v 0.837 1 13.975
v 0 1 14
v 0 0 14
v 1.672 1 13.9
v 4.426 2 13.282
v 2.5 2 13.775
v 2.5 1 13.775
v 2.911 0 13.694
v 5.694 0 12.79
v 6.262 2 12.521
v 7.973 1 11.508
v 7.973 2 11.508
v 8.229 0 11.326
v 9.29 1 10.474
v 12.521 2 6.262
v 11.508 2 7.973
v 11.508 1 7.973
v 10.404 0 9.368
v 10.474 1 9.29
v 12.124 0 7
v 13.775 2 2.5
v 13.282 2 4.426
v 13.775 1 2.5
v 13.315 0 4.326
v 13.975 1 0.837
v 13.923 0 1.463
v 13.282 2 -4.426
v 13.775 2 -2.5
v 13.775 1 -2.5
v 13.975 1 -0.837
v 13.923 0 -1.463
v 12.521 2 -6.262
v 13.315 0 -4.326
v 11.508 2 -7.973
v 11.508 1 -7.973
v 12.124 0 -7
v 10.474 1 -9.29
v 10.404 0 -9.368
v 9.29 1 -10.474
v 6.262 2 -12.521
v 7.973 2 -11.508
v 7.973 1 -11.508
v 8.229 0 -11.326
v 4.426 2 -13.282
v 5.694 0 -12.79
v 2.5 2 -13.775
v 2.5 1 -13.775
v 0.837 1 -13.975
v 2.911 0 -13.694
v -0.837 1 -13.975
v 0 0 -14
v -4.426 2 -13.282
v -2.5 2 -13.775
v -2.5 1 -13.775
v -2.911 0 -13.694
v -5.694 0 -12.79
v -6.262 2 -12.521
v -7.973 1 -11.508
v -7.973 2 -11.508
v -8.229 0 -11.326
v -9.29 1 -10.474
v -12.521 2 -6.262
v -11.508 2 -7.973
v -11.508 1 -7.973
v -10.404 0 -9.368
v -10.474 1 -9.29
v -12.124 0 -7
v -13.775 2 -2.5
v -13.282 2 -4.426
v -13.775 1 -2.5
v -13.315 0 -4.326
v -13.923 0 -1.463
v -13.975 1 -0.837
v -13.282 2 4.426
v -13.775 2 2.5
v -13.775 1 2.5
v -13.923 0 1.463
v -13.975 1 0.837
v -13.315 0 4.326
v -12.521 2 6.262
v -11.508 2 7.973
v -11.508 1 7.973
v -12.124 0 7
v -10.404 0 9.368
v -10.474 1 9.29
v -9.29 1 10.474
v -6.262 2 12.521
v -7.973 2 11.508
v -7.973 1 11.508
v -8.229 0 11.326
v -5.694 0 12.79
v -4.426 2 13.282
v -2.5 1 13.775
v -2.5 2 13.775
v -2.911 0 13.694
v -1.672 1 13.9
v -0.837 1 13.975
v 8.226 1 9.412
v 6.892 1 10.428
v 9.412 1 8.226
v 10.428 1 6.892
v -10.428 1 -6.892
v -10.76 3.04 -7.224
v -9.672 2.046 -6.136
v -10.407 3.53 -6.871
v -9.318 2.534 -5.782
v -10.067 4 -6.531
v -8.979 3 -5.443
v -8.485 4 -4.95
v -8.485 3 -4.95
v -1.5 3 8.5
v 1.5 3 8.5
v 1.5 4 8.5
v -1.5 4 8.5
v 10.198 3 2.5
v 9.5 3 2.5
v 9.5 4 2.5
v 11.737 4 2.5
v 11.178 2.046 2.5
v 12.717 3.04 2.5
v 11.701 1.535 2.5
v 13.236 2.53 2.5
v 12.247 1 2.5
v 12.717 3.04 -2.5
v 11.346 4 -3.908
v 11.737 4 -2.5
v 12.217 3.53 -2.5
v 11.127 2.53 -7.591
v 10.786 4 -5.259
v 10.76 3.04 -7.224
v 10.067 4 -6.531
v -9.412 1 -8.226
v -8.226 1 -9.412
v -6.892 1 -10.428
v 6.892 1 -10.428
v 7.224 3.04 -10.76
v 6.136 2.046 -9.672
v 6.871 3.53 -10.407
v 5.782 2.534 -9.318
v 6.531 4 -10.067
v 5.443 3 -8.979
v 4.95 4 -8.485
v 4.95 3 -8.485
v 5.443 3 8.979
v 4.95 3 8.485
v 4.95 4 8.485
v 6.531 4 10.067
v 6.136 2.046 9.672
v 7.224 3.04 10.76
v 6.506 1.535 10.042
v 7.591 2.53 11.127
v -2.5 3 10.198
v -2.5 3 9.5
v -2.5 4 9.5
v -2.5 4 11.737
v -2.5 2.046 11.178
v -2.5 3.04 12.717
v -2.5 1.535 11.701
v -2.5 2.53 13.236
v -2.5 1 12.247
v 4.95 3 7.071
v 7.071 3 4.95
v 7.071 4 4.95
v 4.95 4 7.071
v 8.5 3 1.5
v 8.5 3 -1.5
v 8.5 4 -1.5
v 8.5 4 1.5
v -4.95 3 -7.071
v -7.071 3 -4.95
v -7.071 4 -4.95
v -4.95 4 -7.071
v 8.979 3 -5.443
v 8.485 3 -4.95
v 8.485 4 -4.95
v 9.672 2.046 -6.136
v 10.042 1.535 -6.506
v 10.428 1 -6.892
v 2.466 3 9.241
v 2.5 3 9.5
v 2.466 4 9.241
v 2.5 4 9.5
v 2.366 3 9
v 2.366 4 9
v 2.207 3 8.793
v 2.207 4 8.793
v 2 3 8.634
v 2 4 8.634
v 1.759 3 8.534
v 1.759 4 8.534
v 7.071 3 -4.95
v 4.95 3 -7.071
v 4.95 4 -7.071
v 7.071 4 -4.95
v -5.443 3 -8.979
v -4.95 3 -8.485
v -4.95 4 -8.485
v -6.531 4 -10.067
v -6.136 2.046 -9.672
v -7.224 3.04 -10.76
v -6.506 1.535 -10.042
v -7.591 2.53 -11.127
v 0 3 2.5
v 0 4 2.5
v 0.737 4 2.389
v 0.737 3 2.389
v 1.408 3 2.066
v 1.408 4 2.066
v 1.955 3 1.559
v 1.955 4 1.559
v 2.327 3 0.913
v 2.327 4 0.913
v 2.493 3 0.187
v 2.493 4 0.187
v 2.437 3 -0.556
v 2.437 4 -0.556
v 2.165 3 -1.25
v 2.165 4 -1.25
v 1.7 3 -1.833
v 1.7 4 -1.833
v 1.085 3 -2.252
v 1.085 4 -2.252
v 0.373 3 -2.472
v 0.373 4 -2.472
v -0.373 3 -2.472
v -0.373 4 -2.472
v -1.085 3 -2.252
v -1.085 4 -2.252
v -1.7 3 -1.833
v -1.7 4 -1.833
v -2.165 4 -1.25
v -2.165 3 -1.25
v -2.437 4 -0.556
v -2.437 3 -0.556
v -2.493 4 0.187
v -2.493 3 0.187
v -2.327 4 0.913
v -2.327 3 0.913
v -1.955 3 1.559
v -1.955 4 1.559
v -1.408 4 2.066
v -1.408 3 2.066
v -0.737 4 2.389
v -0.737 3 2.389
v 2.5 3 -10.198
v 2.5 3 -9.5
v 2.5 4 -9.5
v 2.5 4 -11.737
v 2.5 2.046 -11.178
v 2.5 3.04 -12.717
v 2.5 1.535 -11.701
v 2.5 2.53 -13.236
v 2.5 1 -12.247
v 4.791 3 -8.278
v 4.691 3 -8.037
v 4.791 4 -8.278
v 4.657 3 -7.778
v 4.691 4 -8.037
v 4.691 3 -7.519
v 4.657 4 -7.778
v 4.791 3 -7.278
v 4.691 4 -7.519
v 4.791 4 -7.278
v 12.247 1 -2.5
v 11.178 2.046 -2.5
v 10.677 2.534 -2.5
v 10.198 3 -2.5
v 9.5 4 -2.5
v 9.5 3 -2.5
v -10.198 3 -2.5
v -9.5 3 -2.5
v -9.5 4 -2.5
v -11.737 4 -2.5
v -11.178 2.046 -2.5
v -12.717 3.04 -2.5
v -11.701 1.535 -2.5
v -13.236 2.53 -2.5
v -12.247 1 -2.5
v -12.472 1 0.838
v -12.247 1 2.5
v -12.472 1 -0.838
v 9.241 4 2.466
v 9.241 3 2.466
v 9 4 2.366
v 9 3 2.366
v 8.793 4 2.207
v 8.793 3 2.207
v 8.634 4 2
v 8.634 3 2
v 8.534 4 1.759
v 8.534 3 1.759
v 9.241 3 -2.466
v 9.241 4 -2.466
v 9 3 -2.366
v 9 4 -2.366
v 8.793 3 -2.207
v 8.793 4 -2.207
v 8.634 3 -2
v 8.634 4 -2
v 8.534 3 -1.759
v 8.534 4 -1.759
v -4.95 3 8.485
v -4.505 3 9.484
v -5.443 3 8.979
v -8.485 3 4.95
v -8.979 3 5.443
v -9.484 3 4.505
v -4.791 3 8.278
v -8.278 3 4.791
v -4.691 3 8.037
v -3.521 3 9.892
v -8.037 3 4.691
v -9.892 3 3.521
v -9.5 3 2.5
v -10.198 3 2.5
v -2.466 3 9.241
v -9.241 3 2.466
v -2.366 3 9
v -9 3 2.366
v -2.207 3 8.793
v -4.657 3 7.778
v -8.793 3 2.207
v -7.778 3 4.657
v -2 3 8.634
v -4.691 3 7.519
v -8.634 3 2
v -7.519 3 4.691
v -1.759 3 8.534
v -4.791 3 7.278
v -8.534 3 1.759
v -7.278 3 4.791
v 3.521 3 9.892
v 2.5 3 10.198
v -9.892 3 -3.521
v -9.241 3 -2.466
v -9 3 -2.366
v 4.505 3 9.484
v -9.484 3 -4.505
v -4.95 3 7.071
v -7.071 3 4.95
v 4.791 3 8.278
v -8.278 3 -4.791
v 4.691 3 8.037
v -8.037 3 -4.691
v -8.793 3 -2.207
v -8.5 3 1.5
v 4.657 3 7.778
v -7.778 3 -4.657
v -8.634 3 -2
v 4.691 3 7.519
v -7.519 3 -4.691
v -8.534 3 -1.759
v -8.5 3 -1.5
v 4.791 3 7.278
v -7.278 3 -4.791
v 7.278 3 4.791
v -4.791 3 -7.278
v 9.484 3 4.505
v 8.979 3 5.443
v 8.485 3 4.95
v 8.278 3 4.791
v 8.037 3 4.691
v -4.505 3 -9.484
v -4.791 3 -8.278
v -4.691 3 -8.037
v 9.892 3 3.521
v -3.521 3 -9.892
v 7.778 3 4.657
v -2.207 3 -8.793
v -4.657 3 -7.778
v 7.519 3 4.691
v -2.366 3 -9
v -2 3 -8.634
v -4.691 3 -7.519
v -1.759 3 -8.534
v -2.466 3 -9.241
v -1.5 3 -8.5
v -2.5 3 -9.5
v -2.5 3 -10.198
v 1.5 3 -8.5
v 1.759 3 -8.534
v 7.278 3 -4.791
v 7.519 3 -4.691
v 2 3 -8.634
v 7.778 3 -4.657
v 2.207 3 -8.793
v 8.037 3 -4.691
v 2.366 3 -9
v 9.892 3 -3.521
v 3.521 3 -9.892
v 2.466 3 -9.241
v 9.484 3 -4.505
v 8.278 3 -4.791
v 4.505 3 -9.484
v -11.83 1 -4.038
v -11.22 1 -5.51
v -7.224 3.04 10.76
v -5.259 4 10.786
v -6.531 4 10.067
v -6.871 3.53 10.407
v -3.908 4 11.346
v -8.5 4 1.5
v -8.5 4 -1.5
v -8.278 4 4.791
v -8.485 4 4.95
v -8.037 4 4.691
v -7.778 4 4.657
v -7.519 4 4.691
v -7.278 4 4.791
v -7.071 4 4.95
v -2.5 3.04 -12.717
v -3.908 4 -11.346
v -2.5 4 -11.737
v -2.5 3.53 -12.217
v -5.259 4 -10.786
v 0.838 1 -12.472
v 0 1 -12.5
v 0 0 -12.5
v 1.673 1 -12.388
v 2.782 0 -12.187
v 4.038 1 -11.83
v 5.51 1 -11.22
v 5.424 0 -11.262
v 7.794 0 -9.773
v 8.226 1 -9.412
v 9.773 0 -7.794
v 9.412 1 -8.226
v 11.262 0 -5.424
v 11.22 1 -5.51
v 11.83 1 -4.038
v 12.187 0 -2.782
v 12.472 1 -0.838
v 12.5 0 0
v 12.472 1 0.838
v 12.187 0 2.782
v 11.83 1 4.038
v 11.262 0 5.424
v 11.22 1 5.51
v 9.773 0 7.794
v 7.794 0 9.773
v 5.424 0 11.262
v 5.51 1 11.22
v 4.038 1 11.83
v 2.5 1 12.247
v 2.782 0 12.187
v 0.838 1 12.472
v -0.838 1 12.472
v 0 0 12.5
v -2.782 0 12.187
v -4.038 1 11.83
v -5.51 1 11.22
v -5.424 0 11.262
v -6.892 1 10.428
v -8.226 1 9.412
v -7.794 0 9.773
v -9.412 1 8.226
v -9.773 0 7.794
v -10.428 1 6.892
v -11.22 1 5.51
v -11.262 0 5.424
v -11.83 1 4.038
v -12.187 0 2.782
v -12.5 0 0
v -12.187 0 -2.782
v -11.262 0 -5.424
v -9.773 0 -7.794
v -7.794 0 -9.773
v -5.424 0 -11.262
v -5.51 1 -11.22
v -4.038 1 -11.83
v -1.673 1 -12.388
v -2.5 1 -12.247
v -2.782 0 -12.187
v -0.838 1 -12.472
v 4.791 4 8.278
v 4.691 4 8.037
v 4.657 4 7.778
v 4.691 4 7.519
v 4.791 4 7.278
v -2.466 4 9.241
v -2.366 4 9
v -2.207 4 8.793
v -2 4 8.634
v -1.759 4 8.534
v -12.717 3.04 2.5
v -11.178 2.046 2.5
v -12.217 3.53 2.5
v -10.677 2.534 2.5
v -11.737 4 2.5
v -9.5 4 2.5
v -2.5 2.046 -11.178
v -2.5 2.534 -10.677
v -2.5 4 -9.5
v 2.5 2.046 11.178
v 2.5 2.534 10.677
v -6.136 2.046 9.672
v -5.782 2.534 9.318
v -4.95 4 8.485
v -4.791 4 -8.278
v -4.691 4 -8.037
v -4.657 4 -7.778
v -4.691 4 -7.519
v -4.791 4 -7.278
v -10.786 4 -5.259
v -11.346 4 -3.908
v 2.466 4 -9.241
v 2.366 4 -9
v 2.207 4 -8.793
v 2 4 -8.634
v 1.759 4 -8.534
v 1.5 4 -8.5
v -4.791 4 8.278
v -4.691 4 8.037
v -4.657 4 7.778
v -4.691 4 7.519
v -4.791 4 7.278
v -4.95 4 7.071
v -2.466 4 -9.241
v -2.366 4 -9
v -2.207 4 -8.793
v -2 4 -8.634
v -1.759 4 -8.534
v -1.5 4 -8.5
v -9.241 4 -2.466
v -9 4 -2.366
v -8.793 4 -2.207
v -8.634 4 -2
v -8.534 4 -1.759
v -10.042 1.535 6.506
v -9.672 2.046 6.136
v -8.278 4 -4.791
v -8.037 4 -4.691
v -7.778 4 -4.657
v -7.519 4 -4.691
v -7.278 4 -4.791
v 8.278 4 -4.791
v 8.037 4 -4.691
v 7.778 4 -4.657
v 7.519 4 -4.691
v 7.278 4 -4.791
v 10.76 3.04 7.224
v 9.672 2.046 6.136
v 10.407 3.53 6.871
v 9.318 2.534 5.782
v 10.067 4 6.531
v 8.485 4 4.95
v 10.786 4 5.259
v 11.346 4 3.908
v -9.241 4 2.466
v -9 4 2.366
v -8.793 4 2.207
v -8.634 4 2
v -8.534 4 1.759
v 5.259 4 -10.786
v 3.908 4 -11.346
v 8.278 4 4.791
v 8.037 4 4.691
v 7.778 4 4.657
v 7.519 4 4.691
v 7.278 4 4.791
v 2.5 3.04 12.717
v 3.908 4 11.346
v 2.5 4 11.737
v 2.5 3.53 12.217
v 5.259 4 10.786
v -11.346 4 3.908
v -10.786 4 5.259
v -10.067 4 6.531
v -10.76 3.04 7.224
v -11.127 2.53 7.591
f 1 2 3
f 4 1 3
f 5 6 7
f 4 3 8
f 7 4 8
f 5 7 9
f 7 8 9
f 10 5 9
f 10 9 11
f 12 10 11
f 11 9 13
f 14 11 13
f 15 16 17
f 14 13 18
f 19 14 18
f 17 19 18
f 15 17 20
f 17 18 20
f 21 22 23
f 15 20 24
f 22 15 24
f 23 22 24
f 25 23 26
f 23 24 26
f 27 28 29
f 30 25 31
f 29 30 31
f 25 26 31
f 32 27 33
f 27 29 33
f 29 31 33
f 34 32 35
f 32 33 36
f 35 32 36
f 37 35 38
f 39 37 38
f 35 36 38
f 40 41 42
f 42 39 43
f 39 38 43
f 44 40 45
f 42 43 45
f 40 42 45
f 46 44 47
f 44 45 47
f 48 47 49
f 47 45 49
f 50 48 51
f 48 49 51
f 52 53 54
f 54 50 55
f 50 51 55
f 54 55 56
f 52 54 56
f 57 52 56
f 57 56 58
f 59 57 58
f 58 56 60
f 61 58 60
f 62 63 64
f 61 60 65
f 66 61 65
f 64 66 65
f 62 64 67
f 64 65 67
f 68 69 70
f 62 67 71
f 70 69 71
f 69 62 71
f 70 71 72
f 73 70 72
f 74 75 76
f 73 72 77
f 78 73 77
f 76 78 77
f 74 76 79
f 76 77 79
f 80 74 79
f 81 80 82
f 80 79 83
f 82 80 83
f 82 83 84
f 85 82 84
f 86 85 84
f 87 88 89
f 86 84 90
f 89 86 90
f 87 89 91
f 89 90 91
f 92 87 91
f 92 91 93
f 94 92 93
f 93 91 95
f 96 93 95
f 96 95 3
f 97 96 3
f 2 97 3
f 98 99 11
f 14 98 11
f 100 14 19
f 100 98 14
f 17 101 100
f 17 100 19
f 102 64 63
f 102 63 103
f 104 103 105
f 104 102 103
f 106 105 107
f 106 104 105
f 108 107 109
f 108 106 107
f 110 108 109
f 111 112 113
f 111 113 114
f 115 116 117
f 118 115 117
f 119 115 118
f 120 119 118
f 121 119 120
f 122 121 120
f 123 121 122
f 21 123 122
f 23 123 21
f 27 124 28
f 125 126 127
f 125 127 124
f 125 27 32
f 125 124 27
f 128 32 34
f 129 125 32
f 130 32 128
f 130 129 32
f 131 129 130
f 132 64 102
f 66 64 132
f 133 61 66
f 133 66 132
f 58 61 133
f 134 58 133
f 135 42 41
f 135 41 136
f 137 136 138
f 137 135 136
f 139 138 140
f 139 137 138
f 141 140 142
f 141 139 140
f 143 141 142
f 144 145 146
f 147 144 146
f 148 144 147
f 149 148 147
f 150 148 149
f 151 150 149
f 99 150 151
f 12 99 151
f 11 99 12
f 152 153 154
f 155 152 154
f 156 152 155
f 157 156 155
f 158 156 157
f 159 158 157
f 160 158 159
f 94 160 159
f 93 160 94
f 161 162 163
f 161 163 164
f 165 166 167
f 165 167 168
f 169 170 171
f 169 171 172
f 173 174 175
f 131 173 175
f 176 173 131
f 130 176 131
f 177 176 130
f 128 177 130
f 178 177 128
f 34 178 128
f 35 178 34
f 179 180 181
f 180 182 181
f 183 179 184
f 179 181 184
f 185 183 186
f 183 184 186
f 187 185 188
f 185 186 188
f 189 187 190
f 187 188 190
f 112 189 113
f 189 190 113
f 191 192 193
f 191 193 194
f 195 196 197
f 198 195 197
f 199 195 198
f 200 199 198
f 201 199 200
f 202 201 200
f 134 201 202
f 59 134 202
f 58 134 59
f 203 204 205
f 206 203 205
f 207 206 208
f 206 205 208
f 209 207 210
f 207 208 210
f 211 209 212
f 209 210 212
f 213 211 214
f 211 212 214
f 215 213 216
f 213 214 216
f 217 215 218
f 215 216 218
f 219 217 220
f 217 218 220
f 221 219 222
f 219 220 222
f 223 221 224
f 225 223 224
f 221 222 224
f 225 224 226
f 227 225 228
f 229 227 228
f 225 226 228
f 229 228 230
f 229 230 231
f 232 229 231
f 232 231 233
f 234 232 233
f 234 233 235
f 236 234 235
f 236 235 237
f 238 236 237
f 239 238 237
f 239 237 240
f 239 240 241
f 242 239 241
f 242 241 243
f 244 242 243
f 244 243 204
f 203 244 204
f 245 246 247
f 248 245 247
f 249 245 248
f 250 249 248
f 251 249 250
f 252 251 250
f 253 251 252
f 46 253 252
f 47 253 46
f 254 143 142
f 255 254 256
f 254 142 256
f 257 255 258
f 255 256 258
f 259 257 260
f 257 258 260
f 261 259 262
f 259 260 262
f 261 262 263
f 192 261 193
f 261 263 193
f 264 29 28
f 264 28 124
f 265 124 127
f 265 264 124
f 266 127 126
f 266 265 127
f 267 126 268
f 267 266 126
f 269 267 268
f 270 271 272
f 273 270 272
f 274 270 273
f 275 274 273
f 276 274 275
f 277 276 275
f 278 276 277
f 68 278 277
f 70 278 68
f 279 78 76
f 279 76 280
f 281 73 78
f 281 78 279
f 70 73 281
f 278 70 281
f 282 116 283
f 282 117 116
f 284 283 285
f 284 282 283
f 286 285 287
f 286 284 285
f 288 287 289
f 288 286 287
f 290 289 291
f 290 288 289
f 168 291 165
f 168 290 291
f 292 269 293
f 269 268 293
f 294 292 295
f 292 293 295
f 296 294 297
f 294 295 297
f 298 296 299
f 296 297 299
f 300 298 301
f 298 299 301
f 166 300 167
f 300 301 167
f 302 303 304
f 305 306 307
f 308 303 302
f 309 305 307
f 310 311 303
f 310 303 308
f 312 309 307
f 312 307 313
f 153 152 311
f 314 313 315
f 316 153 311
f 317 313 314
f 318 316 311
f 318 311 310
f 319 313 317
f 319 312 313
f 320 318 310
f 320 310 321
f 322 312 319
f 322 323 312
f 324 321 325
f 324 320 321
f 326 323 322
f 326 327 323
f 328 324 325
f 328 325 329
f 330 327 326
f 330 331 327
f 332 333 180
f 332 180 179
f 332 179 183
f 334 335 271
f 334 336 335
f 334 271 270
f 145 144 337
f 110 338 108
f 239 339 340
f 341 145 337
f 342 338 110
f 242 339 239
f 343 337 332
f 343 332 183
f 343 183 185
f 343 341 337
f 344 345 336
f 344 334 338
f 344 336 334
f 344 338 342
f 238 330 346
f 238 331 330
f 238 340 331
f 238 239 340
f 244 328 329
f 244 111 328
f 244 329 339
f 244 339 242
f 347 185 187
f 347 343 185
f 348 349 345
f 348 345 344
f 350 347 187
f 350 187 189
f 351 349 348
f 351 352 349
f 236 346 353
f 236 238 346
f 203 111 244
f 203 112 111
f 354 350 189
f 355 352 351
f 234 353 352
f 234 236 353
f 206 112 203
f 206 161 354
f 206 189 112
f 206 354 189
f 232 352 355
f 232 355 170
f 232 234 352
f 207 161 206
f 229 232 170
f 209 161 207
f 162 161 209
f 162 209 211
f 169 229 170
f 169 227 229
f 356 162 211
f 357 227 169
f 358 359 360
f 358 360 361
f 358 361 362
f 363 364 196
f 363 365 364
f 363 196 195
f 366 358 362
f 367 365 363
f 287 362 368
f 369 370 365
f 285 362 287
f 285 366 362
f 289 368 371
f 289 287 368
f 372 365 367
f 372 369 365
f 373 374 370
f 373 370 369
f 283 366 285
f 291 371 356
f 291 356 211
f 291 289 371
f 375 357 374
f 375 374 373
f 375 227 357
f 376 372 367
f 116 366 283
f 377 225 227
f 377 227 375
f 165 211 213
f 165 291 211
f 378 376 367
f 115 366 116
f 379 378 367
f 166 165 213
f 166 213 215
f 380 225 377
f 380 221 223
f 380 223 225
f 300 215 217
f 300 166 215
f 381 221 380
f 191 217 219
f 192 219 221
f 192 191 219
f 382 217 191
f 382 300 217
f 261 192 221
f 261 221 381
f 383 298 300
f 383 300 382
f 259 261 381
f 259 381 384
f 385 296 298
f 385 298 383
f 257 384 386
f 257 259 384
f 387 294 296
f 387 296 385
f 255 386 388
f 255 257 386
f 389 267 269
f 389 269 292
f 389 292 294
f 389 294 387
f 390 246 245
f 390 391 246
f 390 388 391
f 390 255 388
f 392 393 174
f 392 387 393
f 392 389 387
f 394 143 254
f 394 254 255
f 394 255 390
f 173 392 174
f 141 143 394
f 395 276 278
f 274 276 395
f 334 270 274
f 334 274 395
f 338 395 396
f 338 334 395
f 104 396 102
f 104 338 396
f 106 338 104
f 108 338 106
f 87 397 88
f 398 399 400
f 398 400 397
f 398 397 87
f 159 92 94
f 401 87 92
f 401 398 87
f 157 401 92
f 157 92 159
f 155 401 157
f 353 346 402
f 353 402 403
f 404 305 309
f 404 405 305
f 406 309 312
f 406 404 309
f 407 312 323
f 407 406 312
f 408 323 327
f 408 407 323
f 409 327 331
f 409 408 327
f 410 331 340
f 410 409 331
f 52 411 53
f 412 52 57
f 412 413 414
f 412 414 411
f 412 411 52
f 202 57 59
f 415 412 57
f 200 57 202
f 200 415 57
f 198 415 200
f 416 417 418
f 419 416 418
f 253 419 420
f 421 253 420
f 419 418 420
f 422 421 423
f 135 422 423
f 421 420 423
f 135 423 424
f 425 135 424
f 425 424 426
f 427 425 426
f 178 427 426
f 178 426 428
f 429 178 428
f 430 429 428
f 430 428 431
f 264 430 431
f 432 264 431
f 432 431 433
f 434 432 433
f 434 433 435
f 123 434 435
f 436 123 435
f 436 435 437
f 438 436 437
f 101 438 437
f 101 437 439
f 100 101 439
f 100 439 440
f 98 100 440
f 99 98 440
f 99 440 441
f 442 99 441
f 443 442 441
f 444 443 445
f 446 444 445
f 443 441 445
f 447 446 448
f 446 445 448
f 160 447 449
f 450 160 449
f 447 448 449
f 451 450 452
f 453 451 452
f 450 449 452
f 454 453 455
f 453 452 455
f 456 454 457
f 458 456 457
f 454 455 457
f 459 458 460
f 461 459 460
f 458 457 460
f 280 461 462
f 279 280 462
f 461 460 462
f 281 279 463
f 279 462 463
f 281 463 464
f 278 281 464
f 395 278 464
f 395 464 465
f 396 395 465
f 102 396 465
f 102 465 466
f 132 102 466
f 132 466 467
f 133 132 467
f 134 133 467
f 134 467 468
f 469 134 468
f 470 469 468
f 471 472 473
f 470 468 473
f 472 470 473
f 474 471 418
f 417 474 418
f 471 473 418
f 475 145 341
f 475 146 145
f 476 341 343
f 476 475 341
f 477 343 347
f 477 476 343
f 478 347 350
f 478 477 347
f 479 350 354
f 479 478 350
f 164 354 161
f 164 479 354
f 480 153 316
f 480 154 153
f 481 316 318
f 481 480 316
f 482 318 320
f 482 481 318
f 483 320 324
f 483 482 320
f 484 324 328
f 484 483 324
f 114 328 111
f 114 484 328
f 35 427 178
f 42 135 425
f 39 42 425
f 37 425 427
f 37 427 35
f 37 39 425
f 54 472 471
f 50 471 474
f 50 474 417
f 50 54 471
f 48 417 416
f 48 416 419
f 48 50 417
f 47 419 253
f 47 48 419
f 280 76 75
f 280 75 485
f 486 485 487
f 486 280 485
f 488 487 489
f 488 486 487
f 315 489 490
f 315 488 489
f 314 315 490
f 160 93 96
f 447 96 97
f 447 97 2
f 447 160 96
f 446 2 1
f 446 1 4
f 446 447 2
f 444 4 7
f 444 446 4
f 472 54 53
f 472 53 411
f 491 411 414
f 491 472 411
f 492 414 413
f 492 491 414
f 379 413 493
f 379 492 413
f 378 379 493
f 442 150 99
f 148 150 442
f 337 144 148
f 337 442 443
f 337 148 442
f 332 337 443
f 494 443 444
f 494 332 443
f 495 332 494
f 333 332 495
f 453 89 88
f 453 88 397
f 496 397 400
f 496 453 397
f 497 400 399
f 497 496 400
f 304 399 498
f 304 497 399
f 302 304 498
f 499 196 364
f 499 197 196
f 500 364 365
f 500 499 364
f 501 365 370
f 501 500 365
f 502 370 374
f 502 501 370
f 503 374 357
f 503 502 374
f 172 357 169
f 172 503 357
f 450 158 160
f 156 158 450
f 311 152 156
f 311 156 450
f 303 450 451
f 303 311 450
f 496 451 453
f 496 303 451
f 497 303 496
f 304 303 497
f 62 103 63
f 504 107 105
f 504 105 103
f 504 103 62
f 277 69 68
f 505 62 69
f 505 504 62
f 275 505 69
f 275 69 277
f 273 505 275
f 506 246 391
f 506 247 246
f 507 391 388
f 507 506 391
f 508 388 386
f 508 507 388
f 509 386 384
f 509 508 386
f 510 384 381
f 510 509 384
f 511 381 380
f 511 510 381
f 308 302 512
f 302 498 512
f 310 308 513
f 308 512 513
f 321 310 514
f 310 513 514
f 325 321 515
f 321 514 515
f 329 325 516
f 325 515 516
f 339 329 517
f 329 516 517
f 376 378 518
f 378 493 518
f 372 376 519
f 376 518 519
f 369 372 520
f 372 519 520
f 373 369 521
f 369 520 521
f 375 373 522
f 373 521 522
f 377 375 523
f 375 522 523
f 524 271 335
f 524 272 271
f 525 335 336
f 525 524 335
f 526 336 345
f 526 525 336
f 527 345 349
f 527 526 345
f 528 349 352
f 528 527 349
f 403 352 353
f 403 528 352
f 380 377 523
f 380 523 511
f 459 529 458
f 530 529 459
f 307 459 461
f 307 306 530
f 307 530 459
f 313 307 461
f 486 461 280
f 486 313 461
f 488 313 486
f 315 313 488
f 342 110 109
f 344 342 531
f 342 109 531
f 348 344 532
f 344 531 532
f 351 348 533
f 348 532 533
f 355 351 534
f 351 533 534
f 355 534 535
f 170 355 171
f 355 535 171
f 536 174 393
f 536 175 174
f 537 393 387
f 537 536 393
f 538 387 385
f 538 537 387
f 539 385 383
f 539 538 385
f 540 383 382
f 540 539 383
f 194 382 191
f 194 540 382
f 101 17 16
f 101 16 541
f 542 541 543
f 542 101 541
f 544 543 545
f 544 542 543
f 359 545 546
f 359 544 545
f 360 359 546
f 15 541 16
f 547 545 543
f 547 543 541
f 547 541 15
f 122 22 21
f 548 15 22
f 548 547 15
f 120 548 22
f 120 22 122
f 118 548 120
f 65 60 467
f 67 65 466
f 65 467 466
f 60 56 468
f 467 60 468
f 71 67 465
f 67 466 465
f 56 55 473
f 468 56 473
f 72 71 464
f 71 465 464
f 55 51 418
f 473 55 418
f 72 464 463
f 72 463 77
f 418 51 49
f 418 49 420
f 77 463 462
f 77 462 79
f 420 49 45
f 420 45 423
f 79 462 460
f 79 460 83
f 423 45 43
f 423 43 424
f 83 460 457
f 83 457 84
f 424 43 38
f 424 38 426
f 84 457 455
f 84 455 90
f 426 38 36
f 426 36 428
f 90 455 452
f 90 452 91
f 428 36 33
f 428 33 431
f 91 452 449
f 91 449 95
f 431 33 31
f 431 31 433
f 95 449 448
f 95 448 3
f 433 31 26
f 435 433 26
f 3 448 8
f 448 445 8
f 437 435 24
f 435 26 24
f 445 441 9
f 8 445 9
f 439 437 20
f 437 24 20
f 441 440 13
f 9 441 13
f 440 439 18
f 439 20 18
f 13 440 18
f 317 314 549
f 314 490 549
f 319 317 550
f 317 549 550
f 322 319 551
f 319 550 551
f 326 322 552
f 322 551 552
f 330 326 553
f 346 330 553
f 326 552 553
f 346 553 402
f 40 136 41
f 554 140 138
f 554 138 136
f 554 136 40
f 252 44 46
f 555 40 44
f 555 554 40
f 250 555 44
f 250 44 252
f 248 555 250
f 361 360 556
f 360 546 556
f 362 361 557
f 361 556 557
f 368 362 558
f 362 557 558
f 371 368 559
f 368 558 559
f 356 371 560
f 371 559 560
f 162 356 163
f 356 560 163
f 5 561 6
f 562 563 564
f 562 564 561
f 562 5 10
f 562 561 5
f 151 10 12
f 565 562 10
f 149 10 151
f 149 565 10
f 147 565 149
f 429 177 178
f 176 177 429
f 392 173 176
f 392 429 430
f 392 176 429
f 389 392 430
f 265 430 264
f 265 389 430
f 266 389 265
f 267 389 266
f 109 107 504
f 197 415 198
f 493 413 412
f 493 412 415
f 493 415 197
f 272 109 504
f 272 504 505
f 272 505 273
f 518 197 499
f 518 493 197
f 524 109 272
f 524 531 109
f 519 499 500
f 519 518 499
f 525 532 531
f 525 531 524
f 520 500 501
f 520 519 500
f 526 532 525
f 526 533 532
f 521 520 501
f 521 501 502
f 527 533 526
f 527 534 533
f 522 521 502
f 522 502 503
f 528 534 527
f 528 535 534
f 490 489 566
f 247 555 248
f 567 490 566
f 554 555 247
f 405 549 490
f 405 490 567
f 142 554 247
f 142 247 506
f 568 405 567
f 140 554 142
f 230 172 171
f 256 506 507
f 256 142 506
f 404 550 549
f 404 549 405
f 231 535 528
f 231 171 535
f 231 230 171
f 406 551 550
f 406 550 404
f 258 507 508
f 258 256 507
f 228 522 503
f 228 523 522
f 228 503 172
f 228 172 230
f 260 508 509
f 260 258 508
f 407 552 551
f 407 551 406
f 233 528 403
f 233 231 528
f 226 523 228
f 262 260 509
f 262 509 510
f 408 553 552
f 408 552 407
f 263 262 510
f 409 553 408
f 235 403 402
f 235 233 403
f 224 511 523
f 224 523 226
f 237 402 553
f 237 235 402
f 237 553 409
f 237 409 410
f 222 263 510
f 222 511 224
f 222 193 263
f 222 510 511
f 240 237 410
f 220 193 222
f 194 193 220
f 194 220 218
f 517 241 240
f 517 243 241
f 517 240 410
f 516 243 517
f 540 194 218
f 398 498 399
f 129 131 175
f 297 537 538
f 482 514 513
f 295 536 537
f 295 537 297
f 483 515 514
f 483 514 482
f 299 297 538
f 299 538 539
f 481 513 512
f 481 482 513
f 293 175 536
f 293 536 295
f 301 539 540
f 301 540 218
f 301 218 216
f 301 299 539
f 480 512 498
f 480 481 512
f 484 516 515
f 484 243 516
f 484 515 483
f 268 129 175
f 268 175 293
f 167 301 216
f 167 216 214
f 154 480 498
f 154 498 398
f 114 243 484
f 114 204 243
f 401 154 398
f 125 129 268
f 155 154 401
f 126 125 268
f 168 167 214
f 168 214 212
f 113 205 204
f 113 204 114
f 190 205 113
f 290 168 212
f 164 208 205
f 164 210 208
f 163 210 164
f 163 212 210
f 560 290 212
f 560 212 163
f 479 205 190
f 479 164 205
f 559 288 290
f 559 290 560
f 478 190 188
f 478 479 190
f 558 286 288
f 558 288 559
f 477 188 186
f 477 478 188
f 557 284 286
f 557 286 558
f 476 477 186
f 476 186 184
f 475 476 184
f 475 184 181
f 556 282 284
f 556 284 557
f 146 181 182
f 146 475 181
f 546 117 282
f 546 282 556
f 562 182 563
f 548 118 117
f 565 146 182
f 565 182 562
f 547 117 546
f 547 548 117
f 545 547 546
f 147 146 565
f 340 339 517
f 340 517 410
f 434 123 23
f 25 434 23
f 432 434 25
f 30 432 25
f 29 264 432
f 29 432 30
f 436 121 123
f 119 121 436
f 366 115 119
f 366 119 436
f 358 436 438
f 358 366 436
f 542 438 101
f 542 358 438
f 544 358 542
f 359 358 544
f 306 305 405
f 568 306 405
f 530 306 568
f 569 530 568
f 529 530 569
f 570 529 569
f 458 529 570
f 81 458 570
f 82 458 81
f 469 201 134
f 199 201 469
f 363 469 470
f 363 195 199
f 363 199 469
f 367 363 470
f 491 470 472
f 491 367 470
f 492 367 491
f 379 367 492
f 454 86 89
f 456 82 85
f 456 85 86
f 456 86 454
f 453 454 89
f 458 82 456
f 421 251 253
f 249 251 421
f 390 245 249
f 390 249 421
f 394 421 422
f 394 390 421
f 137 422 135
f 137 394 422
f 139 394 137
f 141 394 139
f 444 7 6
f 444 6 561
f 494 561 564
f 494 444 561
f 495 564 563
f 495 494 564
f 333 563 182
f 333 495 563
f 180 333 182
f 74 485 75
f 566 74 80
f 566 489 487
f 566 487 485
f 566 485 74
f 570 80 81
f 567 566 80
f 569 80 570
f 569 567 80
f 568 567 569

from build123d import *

# Parameters (mm, degrees)
SKETCH1_R           = 14
BOSS_EXTRUDE1_DEPTH = 4
SKETCH2_R           = 12.5
CUT_EXTRUDE1_DEPTH  = 3
CHAMFER2_SIZE       = 2
CUT_EXTRUDE2_START  = -3
CUT_EXTRUDE2_DEPTH  = 3
FILLET2_R           = 1
SKETCH4_R           = 2.5
CUT_EXTRUDE3_DEPTH  = 3


with BuildPart() as part:
    # Sketch1 → Boss-Extrude1 (new body)
    with BuildSketch(Plane(origin=(0, 0, 0), x_dir=(1, 0, 0), z_dir=(0, 1, 0))):
        Circle(SKETCH1_R)
    extrude(amount=BOSS_EXTRUDE1_DEPTH)

    # Sketch2 → Cut-Extrude1 (cut)
    with BuildSketch(Plane.XZ):
        Circle(SKETCH2_R)
    extrude(amount=-CUT_EXTRUDE1_DEPTH, mode=Mode.SUBTRACT)

    # Chamfer2
    chamfer2_edges = [part.edges().sort_by_distance(p)[0] for p in [
        (-12.5, 3, 0),
        (-14, 4, 0),
    ]]
    chamfer(chamfer2_edges, length=CHAMFER2_SIZE)

    # Sketch3 → Cut-Extrude2 (cut)
    with BuildSketch(Plane(origin=(0, 4, 0), x_dir=(1, 0, 0), z_dir=(0, 1, 0)).offset(CUT_EXTRUDE2_START)):
        with BuildLine():
            ThreePointArc((-13.774977314, 2.5), (-14, 0), (-13.774977314, -2.5))
            Line((-13.774977314, -2.5), (-8.5, -2.5))
            Line((-8.5, -2.5), (-8.5, 2.5))
            Line((-8.5, 2.5), (-13.774977314, 2.5))
        make_face()
        with BuildLine():
            Line((-4.242640687, 7.778174593), (-7.972612916, 11.508146822))
            ThreePointArc((-7.972612916, 11.508146822), (-9.899494937, 9.899494937), (-11.508146822, 7.972612916))
            Line((-11.508146822, 7.972612916), (-7.778174593, 4.242640687))
            Line((-7.778174593, 4.242640687), (-4.242640687, 7.778174593))
        make_face()
        with BuildLine():
            Line((-7.972612916, -11.508146822), (-4.242640687, -7.778174593))
            Line((-4.242640687, -7.778174593), (-7.778174593, -4.242640687))
            Line((-7.778174593, -4.242640687), (-11.508146822, -7.972612916))
            ThreePointArc((-11.508146822, -7.972612916), (-9.899494937, -9.899494937), (-7.972612916, -11.508146822))
        make_face()
        with BuildLine():
            Line((2.5, 8.5), (2.5, 13.774977314))
            ThreePointArc((2.5, 13.774977314), (0, 14), (-2.5, 13.774977314))
            Line((-2.5, 13.774977314), (-2.5, 8.5))
            Line((-2.5, 8.5), (2.5, 8.5))
        make_face()
        with BuildLine():
            Line((2.5, -13.774977314), (2.5, -8.5))
            Line((2.5, -8.5), (-2.5, -8.5))
            Line((-2.5, -8.5), (-2.5, -13.774977314))
            ThreePointArc((-2.5, -13.774977314), (0, -14), (2.5, -13.774977314))
        make_face()
        with BuildLine():
            Line((7.778174593, 4.242640687), (11.508146822, 7.972612916))
            ThreePointArc((11.508146822, 7.972612916), (9.899494937, 9.899494937), (7.972612916, 11.508146822))
            Line((7.972612916, 11.508146822), (4.242640687, 7.778174593))
            Line((4.242640687, 7.778174593), (7.778174593, 4.242640687))
        make_face()
        with BuildLine():
            Line((11.508146822, -7.972612916), (7.778174593, -4.242640687))
            Line((7.778174593, -4.242640687), (4.242640687, -7.778174593))
            Line((4.242640687, -7.778174593), (7.972612916, -11.508146822))
            ThreePointArc((7.972612916, -11.508146822), (9.899494937, -9.899494937), (11.508146822, -7.972612916))
        make_face()
        with BuildLine():
            Line((8.5, -2.5), (13.774977314, -2.5))
            ThreePointArc((13.774977314, -2.5), (14, 0), (13.774977314, 2.5))
            Line((13.774977314, 2.5), (8.5, 2.5))
            Line((8.5, 2.5), (8.5, -2.5))
        make_face()
    extrude(amount=CUT_EXTRUDE2_DEPTH, mode=Mode.SUBTRACT)

    # Fillet2
    fillet2_edges = [part.edges().sort_by_distance(p)[0] for p in [
        (8.5, 3.5, 2.5),
        (4.242640687, 3.5, 7.778174593),
        (8.5, 3.5, -2.5),
        (7.778174593, 3.5, -4.242640687),
        (4.242640687, 3.5, -7.778174593),
        (-2.5, 3.5, -8.5),
        (2.5, 3.5, -8.5),
        (-4.242640687, 3.5, -7.778174593),
        (-7.778174593, 3.5, -4.242640687),
        (-8.5, 3.5, 2.5),
        (-8.5, 3.5, -2.5),
        (-4.242640687, 3.5, 7.778174593),
        (2.5, 3.5, 8.5),
        (7.778174593, 3.5, 4.242640687),
        (-7.778174593, 3.5, 4.242640687),
        (-2.5, 3.5, 8.5),
    ]]
    fillet(fillet2_edges, radius=FILLET2_R)

    # Sketch4 → Cut-Extrude3 (cut)
    with BuildSketch(Plane(origin=(0, 4, 0), x_dir=(1, 0, 0), z_dir=(0, 1, 0))):
        Circle(SKETCH4_R)
    extrude(amount=-CUT_EXTRUDE3_DEPTH, mode=Mode.SUBTRACT)


solid = part.part
